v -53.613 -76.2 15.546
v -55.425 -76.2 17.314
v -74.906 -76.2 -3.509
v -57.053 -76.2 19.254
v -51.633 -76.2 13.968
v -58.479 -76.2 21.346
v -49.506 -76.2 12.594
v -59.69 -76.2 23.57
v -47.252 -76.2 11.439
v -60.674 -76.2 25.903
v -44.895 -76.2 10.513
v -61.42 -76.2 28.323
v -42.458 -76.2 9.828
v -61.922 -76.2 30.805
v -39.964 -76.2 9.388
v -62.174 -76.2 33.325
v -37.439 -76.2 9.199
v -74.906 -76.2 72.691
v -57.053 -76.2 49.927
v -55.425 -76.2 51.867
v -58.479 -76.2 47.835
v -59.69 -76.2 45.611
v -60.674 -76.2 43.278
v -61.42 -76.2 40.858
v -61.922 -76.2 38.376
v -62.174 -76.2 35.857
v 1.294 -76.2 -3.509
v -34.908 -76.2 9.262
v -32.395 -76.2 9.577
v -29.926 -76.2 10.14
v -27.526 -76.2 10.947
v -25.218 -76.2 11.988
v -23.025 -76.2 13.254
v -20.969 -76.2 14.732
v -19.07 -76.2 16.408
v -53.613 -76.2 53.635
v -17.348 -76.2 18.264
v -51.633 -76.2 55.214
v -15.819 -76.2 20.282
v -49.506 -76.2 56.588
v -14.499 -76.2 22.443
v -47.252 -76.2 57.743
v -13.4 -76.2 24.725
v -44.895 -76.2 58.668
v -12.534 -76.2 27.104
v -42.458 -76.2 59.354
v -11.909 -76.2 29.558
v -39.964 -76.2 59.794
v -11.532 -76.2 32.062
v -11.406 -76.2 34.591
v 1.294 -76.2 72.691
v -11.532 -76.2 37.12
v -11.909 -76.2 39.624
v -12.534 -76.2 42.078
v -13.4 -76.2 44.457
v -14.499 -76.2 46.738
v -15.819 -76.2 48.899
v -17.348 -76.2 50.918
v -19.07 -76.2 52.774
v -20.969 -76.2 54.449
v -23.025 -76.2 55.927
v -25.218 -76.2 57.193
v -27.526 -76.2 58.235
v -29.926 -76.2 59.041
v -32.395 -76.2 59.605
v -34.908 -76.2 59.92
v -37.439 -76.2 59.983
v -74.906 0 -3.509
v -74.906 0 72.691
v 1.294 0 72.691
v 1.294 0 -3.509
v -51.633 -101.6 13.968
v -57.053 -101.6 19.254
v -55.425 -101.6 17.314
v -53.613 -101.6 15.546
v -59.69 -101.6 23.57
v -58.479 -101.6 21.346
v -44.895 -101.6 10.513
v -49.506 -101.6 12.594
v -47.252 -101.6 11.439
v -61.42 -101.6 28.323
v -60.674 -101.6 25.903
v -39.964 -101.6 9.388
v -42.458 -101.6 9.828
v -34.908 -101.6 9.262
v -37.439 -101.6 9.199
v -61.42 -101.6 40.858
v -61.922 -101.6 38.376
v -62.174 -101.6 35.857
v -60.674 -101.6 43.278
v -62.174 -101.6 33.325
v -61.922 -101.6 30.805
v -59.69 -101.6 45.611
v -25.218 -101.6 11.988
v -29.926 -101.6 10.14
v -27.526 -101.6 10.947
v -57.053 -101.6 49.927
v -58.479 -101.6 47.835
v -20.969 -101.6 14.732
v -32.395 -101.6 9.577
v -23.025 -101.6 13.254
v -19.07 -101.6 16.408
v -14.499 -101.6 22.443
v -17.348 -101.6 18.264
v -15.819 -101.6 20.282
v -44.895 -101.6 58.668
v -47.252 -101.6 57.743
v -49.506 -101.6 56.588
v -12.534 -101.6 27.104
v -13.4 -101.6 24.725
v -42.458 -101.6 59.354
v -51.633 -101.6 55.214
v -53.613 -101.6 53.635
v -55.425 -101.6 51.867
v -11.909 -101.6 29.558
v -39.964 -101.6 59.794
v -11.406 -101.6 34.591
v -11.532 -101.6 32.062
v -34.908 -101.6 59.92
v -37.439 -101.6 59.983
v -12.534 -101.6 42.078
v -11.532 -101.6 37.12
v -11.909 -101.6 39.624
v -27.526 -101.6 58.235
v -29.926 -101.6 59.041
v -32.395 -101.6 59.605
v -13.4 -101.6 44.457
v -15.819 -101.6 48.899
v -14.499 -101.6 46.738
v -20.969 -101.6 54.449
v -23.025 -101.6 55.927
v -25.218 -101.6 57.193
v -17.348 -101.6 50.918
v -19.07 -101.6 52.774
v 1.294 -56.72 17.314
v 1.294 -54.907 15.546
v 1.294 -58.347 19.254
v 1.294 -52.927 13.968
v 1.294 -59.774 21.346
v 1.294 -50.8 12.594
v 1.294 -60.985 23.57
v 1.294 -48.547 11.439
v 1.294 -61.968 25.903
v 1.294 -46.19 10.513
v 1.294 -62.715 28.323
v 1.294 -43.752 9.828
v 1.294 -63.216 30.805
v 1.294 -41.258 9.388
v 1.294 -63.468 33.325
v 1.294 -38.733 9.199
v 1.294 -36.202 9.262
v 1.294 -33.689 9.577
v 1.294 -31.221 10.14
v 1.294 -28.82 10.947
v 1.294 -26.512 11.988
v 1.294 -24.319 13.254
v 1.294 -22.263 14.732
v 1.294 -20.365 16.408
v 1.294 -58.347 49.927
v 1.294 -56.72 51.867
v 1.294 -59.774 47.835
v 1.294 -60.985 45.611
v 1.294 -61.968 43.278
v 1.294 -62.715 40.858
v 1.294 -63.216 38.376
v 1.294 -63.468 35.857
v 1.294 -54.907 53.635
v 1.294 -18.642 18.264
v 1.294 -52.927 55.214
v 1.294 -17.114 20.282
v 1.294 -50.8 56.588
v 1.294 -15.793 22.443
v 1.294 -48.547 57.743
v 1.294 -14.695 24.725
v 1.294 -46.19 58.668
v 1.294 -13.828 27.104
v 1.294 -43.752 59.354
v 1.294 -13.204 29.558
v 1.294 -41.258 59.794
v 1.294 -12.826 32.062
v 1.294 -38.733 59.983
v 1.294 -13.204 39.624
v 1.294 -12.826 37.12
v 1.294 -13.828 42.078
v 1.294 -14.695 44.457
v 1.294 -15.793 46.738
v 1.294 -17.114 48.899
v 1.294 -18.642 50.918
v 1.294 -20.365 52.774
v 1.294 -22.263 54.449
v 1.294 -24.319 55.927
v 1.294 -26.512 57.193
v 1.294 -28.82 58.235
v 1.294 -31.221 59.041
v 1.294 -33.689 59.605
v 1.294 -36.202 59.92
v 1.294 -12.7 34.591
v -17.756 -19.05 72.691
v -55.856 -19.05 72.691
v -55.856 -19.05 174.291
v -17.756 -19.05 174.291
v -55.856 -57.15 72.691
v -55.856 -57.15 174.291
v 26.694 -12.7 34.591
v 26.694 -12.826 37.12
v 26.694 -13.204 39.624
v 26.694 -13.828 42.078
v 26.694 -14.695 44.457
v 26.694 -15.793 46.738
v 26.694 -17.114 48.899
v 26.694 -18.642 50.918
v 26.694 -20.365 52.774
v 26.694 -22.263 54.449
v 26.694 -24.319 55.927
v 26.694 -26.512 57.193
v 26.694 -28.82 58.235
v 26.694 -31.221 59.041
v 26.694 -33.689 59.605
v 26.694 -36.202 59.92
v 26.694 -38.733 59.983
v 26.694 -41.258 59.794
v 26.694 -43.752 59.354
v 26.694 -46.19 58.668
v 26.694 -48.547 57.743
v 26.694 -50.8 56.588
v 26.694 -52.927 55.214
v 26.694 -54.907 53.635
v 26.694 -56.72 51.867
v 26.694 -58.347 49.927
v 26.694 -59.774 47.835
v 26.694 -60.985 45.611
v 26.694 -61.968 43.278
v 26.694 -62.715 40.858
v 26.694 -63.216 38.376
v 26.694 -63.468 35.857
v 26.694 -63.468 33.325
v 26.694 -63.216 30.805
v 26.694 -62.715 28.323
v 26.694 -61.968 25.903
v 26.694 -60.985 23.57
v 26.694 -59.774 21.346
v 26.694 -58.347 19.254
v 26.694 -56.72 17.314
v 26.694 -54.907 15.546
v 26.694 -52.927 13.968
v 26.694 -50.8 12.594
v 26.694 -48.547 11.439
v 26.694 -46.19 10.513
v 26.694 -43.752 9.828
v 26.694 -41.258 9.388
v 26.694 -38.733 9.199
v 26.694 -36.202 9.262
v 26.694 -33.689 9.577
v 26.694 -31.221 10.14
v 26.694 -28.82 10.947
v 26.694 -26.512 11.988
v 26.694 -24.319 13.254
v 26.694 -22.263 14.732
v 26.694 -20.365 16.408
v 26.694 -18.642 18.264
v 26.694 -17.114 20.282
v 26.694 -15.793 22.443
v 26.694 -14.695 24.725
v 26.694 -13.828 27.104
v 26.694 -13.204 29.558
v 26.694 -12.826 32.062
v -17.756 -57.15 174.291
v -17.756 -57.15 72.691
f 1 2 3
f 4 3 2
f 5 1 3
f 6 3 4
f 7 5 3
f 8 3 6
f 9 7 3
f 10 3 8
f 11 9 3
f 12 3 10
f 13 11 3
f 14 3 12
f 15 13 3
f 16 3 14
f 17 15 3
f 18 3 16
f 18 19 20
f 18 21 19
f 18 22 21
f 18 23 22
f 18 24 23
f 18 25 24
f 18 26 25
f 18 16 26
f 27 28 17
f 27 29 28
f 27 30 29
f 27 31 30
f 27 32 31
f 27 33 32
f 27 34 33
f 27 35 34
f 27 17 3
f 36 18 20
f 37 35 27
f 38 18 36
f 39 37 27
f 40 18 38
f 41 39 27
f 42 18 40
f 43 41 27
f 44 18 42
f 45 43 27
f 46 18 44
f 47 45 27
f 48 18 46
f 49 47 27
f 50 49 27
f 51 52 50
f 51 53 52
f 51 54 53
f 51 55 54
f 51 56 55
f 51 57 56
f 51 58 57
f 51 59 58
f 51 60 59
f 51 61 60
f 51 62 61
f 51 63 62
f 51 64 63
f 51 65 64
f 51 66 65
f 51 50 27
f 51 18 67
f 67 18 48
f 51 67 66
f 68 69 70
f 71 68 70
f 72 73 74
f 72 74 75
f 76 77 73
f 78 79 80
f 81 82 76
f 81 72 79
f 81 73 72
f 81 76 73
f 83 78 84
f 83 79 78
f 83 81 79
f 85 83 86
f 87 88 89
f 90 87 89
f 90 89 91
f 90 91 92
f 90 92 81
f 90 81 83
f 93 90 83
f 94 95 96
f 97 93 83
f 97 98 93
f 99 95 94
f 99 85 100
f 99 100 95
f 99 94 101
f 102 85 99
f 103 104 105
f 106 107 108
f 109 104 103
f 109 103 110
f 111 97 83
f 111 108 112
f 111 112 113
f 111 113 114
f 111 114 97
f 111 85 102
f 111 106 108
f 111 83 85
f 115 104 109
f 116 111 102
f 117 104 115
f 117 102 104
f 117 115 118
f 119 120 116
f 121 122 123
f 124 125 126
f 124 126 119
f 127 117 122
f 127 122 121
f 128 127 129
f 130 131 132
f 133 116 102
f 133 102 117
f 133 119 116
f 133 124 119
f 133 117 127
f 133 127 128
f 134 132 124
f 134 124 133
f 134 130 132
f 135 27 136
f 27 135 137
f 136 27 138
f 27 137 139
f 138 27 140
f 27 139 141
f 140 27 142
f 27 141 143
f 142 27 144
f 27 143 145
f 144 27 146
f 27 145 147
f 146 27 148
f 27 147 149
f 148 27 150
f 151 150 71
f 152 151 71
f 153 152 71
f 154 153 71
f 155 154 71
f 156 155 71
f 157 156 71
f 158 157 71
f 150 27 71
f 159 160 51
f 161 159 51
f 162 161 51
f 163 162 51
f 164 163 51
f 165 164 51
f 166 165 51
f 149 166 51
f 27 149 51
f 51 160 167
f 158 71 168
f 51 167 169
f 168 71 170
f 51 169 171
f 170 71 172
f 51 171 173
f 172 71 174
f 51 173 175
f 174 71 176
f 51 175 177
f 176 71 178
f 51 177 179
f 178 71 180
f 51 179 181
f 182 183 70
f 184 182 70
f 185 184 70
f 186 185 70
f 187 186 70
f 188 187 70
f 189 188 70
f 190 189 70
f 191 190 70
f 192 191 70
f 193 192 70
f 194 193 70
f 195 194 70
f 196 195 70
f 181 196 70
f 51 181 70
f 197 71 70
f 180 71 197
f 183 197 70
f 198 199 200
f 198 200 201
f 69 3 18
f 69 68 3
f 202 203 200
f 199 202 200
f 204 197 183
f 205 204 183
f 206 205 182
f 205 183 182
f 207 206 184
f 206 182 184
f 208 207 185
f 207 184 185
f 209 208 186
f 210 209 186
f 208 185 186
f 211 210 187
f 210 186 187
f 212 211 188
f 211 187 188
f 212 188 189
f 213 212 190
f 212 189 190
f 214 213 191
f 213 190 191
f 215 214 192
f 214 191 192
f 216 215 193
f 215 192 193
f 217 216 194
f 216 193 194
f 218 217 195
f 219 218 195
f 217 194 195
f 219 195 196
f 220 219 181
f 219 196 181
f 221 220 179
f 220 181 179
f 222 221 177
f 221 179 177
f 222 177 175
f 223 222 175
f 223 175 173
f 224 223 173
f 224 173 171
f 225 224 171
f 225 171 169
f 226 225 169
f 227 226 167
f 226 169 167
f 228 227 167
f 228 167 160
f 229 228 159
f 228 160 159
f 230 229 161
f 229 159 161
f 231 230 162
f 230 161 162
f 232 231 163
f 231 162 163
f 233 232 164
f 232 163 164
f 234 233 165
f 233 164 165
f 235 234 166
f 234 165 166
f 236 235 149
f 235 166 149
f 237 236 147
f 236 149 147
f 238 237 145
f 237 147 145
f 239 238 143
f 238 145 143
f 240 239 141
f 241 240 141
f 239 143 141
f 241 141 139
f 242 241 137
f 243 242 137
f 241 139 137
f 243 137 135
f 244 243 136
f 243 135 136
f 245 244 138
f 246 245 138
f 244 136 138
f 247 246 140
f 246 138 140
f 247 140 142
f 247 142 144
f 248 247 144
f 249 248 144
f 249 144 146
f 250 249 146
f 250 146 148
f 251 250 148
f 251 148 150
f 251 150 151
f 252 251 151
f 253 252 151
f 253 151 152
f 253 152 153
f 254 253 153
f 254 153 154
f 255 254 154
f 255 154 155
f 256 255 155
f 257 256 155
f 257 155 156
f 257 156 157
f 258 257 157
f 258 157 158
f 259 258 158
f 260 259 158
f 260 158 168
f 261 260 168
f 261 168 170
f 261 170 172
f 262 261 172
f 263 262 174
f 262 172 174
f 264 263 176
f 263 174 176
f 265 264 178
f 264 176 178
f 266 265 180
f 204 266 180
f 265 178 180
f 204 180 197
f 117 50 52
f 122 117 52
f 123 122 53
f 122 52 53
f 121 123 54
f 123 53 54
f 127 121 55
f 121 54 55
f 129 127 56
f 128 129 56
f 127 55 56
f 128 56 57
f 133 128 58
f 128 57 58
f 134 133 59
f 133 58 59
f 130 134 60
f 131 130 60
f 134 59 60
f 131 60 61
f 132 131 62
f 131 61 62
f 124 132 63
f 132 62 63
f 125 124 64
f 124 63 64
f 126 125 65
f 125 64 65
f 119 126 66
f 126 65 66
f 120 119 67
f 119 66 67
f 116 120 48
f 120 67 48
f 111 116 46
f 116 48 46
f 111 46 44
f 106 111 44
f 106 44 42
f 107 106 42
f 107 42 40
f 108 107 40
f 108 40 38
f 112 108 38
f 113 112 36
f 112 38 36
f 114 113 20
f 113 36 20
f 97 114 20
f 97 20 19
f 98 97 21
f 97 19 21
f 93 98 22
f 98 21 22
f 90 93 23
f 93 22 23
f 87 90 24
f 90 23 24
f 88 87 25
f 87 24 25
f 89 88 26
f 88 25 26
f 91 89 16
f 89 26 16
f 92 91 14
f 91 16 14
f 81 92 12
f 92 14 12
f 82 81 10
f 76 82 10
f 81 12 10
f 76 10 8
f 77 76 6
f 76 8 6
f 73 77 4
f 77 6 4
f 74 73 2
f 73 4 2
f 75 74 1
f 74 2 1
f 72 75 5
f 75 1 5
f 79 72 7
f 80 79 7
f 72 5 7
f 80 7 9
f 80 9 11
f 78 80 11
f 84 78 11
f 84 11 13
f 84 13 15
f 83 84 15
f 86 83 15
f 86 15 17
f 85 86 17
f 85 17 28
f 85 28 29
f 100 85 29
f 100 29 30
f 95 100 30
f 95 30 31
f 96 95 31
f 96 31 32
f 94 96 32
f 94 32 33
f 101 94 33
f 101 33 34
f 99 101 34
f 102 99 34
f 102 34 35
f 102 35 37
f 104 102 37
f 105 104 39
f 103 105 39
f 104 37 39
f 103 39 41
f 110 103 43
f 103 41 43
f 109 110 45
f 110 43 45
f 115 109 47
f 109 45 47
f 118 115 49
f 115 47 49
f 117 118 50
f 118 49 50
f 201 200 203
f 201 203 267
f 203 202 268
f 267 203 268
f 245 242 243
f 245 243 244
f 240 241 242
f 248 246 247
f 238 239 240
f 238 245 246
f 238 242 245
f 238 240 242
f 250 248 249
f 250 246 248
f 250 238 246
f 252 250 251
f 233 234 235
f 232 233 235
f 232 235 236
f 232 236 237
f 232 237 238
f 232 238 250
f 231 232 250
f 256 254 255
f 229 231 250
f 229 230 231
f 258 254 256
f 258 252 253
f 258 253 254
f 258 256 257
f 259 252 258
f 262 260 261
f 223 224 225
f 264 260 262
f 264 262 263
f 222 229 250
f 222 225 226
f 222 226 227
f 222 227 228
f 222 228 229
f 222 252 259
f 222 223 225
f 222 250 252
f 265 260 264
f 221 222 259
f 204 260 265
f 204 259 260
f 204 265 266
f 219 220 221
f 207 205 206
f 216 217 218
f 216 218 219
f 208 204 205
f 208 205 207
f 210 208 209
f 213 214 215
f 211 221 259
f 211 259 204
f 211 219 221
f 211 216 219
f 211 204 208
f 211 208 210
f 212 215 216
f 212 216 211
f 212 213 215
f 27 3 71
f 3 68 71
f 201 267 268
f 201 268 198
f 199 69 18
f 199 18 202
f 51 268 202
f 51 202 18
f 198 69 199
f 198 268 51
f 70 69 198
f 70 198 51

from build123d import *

# Parameters (mm, degrees)
F0_W      = 76.2
F0_H      = 76.2
F1_DEPTH  = 25.4
F1_FACE_W = 76.2
F1_FACE_H = 76.2
F2_DEPTH  = 50.8
F3_R      = 25.4
F4_DEPTH  = 25.4
F5_R      = 25.4
F6_DEPTH  = 25.4
F7_W      = 38.1
F7_H      = 38.1
F8_DEPTH  = 101.6


with BuildPart() as f1:
    # F0 (on Front) → F1 (new body)
    with BuildSketch(Plane.XZ):
        with Locations((-36.805706, 34.59075)):
            Rectangle(F0_W, F0_H)
    extrude(amount=F1_DEPTH)

    # F1_face (on face) → F2 (join)
    with BuildSketch(Plane(origin=(-36.805706, -25.4, 34.59075), x_dir=(1, 0, 0), z_dir=(0, -1, 0))):
        Rectangle(F1_FACE_W, F1_FACE_H)
    extrude(amount=F2_DEPTH)

    # F3 (on face) → F4 (join)
    with BuildSketch(Plane.XZ.offset(76.2)):
        with Locations((-36.805706, 34.59075)):
            Circle(F3_R)
    extrude(amount=F4_DEPTH)

    # F5 (on face) → F6 (join)
    with BuildSketch(Plane.YZ.offset(1.294294)):
        with Locations((-38.1, 34.59075)):
            Circle(F5_R)
    extrude(amount=F6_DEPTH)

    # F7 (on face) → F8 (join)
    with BuildSketch(Plane.XY.offset(72.69075)):
        with Locations((-36.805706, -38.1)):
            Rectangle(F7_W, F7_H)
    extrude(amount=F8_DEPTH)


solid = f1.part
